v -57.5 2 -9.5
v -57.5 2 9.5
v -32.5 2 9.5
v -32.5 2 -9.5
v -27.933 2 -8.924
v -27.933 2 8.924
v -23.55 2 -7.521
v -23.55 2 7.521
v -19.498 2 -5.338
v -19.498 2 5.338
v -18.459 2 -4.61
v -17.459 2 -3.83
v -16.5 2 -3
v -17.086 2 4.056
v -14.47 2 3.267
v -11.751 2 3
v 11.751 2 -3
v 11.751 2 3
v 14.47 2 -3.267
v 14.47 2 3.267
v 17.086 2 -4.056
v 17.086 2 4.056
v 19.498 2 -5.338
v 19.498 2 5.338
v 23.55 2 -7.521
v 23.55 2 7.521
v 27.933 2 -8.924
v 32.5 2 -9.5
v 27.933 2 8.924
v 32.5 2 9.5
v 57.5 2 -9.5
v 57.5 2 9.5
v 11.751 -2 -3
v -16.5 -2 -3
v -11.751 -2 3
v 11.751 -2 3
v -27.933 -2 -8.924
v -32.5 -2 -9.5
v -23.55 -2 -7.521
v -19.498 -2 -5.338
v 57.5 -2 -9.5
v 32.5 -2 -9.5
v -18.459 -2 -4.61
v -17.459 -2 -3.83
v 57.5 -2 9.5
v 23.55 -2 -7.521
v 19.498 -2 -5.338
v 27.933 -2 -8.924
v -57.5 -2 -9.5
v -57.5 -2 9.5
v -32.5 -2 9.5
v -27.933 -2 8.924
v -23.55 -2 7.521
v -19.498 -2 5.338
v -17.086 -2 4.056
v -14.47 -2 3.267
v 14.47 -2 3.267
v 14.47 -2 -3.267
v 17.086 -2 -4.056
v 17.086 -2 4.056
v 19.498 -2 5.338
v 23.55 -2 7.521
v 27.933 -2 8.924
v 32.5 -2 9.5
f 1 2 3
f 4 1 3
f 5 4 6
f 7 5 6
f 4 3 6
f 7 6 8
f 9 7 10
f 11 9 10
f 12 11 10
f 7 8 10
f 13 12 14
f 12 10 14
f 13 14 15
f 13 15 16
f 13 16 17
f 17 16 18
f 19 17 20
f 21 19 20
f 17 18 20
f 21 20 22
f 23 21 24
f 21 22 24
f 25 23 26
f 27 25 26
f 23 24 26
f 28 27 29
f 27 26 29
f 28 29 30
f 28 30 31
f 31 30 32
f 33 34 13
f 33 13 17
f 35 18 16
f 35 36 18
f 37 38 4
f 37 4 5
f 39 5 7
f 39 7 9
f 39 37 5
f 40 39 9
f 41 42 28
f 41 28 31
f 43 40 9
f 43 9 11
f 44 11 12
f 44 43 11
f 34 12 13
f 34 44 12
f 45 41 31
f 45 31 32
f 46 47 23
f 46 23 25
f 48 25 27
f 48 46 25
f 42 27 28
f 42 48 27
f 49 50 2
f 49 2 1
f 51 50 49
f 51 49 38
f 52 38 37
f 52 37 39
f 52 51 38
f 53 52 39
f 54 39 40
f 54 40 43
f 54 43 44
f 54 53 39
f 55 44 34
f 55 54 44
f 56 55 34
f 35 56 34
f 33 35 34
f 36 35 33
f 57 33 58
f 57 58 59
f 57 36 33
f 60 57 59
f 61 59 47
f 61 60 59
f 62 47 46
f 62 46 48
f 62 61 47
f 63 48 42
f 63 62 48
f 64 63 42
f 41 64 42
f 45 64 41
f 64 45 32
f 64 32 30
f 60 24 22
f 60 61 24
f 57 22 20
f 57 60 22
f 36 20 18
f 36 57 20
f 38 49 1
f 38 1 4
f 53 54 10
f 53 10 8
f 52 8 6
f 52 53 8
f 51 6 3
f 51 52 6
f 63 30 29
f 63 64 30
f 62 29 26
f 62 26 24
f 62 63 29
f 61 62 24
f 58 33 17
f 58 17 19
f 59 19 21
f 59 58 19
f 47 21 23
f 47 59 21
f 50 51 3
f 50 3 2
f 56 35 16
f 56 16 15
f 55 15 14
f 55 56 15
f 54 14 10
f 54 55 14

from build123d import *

# Parameters (mm, degrees)
F1_DEPTH = 2


with BuildPart() as f1:
    # F0 (on Front) → F1 (new body, symmetric)
    with BuildSketch(Plane.XZ):
        with BuildLine():
            Line((11.751494, 3), (0, 3))
            Line((0, 3), (-11.751494, 3))
            ThreePointArc((-11.751494, 3), (-15.797231, 3.597313), (-19.497744, 5.338285))
            ThreePointArc((-19.497744, 5.338285), (-25.709291, 8.323868), (-32.5, 9.5))
            Line((-32.5, 9.5), (-57.5, 9.5))
            Line((-57.5, 9.5), (-57.5, 0))
            Line((-57.5, 0), (-57.5, -9.5))
            Line((-57.5, -9.5), (-32.5, -9.5))
            ThreePointArc((-32.5, -9.5), (-25.709291, -8.323868), (-19.497744, -5.338285))
            ThreePointArc((-19.497744, -5.338285), (-17.954359, -4.22621), (-16.5, -3))
            Line((-16.5, -3), (-11.751494, -3))
            Line((-11.751494, -3), (0, -3))
            Line((0, -3), (11.751494, -3))
            ThreePointArc((11.751494, -3), (15.797231, -3.597313), (19.497744, -5.338285))
            ThreePointArc((19.497744, -5.338285), (25.709291, -8.323868), (32.5, -9.5))
            Line((32.5, -9.5), (57.5, -9.5))
            Line((57.5, -9.5), (57.5, 0))
            Line((57.5, 0), (57.5, 9.5))
            Line((57.5, 9.5), (32.5, 9.5))
            ThreePointArc((32.5, 9.5), (25.709291, 8.323868), (19.497744, 5.338285))
            ThreePointArc((19.497744, 5.338285), (15.797231, 3.597313), (11.751494, 3))
        make_face()
    extrude(amount=F1_DEPTH, both=True)


solid = f1.part
